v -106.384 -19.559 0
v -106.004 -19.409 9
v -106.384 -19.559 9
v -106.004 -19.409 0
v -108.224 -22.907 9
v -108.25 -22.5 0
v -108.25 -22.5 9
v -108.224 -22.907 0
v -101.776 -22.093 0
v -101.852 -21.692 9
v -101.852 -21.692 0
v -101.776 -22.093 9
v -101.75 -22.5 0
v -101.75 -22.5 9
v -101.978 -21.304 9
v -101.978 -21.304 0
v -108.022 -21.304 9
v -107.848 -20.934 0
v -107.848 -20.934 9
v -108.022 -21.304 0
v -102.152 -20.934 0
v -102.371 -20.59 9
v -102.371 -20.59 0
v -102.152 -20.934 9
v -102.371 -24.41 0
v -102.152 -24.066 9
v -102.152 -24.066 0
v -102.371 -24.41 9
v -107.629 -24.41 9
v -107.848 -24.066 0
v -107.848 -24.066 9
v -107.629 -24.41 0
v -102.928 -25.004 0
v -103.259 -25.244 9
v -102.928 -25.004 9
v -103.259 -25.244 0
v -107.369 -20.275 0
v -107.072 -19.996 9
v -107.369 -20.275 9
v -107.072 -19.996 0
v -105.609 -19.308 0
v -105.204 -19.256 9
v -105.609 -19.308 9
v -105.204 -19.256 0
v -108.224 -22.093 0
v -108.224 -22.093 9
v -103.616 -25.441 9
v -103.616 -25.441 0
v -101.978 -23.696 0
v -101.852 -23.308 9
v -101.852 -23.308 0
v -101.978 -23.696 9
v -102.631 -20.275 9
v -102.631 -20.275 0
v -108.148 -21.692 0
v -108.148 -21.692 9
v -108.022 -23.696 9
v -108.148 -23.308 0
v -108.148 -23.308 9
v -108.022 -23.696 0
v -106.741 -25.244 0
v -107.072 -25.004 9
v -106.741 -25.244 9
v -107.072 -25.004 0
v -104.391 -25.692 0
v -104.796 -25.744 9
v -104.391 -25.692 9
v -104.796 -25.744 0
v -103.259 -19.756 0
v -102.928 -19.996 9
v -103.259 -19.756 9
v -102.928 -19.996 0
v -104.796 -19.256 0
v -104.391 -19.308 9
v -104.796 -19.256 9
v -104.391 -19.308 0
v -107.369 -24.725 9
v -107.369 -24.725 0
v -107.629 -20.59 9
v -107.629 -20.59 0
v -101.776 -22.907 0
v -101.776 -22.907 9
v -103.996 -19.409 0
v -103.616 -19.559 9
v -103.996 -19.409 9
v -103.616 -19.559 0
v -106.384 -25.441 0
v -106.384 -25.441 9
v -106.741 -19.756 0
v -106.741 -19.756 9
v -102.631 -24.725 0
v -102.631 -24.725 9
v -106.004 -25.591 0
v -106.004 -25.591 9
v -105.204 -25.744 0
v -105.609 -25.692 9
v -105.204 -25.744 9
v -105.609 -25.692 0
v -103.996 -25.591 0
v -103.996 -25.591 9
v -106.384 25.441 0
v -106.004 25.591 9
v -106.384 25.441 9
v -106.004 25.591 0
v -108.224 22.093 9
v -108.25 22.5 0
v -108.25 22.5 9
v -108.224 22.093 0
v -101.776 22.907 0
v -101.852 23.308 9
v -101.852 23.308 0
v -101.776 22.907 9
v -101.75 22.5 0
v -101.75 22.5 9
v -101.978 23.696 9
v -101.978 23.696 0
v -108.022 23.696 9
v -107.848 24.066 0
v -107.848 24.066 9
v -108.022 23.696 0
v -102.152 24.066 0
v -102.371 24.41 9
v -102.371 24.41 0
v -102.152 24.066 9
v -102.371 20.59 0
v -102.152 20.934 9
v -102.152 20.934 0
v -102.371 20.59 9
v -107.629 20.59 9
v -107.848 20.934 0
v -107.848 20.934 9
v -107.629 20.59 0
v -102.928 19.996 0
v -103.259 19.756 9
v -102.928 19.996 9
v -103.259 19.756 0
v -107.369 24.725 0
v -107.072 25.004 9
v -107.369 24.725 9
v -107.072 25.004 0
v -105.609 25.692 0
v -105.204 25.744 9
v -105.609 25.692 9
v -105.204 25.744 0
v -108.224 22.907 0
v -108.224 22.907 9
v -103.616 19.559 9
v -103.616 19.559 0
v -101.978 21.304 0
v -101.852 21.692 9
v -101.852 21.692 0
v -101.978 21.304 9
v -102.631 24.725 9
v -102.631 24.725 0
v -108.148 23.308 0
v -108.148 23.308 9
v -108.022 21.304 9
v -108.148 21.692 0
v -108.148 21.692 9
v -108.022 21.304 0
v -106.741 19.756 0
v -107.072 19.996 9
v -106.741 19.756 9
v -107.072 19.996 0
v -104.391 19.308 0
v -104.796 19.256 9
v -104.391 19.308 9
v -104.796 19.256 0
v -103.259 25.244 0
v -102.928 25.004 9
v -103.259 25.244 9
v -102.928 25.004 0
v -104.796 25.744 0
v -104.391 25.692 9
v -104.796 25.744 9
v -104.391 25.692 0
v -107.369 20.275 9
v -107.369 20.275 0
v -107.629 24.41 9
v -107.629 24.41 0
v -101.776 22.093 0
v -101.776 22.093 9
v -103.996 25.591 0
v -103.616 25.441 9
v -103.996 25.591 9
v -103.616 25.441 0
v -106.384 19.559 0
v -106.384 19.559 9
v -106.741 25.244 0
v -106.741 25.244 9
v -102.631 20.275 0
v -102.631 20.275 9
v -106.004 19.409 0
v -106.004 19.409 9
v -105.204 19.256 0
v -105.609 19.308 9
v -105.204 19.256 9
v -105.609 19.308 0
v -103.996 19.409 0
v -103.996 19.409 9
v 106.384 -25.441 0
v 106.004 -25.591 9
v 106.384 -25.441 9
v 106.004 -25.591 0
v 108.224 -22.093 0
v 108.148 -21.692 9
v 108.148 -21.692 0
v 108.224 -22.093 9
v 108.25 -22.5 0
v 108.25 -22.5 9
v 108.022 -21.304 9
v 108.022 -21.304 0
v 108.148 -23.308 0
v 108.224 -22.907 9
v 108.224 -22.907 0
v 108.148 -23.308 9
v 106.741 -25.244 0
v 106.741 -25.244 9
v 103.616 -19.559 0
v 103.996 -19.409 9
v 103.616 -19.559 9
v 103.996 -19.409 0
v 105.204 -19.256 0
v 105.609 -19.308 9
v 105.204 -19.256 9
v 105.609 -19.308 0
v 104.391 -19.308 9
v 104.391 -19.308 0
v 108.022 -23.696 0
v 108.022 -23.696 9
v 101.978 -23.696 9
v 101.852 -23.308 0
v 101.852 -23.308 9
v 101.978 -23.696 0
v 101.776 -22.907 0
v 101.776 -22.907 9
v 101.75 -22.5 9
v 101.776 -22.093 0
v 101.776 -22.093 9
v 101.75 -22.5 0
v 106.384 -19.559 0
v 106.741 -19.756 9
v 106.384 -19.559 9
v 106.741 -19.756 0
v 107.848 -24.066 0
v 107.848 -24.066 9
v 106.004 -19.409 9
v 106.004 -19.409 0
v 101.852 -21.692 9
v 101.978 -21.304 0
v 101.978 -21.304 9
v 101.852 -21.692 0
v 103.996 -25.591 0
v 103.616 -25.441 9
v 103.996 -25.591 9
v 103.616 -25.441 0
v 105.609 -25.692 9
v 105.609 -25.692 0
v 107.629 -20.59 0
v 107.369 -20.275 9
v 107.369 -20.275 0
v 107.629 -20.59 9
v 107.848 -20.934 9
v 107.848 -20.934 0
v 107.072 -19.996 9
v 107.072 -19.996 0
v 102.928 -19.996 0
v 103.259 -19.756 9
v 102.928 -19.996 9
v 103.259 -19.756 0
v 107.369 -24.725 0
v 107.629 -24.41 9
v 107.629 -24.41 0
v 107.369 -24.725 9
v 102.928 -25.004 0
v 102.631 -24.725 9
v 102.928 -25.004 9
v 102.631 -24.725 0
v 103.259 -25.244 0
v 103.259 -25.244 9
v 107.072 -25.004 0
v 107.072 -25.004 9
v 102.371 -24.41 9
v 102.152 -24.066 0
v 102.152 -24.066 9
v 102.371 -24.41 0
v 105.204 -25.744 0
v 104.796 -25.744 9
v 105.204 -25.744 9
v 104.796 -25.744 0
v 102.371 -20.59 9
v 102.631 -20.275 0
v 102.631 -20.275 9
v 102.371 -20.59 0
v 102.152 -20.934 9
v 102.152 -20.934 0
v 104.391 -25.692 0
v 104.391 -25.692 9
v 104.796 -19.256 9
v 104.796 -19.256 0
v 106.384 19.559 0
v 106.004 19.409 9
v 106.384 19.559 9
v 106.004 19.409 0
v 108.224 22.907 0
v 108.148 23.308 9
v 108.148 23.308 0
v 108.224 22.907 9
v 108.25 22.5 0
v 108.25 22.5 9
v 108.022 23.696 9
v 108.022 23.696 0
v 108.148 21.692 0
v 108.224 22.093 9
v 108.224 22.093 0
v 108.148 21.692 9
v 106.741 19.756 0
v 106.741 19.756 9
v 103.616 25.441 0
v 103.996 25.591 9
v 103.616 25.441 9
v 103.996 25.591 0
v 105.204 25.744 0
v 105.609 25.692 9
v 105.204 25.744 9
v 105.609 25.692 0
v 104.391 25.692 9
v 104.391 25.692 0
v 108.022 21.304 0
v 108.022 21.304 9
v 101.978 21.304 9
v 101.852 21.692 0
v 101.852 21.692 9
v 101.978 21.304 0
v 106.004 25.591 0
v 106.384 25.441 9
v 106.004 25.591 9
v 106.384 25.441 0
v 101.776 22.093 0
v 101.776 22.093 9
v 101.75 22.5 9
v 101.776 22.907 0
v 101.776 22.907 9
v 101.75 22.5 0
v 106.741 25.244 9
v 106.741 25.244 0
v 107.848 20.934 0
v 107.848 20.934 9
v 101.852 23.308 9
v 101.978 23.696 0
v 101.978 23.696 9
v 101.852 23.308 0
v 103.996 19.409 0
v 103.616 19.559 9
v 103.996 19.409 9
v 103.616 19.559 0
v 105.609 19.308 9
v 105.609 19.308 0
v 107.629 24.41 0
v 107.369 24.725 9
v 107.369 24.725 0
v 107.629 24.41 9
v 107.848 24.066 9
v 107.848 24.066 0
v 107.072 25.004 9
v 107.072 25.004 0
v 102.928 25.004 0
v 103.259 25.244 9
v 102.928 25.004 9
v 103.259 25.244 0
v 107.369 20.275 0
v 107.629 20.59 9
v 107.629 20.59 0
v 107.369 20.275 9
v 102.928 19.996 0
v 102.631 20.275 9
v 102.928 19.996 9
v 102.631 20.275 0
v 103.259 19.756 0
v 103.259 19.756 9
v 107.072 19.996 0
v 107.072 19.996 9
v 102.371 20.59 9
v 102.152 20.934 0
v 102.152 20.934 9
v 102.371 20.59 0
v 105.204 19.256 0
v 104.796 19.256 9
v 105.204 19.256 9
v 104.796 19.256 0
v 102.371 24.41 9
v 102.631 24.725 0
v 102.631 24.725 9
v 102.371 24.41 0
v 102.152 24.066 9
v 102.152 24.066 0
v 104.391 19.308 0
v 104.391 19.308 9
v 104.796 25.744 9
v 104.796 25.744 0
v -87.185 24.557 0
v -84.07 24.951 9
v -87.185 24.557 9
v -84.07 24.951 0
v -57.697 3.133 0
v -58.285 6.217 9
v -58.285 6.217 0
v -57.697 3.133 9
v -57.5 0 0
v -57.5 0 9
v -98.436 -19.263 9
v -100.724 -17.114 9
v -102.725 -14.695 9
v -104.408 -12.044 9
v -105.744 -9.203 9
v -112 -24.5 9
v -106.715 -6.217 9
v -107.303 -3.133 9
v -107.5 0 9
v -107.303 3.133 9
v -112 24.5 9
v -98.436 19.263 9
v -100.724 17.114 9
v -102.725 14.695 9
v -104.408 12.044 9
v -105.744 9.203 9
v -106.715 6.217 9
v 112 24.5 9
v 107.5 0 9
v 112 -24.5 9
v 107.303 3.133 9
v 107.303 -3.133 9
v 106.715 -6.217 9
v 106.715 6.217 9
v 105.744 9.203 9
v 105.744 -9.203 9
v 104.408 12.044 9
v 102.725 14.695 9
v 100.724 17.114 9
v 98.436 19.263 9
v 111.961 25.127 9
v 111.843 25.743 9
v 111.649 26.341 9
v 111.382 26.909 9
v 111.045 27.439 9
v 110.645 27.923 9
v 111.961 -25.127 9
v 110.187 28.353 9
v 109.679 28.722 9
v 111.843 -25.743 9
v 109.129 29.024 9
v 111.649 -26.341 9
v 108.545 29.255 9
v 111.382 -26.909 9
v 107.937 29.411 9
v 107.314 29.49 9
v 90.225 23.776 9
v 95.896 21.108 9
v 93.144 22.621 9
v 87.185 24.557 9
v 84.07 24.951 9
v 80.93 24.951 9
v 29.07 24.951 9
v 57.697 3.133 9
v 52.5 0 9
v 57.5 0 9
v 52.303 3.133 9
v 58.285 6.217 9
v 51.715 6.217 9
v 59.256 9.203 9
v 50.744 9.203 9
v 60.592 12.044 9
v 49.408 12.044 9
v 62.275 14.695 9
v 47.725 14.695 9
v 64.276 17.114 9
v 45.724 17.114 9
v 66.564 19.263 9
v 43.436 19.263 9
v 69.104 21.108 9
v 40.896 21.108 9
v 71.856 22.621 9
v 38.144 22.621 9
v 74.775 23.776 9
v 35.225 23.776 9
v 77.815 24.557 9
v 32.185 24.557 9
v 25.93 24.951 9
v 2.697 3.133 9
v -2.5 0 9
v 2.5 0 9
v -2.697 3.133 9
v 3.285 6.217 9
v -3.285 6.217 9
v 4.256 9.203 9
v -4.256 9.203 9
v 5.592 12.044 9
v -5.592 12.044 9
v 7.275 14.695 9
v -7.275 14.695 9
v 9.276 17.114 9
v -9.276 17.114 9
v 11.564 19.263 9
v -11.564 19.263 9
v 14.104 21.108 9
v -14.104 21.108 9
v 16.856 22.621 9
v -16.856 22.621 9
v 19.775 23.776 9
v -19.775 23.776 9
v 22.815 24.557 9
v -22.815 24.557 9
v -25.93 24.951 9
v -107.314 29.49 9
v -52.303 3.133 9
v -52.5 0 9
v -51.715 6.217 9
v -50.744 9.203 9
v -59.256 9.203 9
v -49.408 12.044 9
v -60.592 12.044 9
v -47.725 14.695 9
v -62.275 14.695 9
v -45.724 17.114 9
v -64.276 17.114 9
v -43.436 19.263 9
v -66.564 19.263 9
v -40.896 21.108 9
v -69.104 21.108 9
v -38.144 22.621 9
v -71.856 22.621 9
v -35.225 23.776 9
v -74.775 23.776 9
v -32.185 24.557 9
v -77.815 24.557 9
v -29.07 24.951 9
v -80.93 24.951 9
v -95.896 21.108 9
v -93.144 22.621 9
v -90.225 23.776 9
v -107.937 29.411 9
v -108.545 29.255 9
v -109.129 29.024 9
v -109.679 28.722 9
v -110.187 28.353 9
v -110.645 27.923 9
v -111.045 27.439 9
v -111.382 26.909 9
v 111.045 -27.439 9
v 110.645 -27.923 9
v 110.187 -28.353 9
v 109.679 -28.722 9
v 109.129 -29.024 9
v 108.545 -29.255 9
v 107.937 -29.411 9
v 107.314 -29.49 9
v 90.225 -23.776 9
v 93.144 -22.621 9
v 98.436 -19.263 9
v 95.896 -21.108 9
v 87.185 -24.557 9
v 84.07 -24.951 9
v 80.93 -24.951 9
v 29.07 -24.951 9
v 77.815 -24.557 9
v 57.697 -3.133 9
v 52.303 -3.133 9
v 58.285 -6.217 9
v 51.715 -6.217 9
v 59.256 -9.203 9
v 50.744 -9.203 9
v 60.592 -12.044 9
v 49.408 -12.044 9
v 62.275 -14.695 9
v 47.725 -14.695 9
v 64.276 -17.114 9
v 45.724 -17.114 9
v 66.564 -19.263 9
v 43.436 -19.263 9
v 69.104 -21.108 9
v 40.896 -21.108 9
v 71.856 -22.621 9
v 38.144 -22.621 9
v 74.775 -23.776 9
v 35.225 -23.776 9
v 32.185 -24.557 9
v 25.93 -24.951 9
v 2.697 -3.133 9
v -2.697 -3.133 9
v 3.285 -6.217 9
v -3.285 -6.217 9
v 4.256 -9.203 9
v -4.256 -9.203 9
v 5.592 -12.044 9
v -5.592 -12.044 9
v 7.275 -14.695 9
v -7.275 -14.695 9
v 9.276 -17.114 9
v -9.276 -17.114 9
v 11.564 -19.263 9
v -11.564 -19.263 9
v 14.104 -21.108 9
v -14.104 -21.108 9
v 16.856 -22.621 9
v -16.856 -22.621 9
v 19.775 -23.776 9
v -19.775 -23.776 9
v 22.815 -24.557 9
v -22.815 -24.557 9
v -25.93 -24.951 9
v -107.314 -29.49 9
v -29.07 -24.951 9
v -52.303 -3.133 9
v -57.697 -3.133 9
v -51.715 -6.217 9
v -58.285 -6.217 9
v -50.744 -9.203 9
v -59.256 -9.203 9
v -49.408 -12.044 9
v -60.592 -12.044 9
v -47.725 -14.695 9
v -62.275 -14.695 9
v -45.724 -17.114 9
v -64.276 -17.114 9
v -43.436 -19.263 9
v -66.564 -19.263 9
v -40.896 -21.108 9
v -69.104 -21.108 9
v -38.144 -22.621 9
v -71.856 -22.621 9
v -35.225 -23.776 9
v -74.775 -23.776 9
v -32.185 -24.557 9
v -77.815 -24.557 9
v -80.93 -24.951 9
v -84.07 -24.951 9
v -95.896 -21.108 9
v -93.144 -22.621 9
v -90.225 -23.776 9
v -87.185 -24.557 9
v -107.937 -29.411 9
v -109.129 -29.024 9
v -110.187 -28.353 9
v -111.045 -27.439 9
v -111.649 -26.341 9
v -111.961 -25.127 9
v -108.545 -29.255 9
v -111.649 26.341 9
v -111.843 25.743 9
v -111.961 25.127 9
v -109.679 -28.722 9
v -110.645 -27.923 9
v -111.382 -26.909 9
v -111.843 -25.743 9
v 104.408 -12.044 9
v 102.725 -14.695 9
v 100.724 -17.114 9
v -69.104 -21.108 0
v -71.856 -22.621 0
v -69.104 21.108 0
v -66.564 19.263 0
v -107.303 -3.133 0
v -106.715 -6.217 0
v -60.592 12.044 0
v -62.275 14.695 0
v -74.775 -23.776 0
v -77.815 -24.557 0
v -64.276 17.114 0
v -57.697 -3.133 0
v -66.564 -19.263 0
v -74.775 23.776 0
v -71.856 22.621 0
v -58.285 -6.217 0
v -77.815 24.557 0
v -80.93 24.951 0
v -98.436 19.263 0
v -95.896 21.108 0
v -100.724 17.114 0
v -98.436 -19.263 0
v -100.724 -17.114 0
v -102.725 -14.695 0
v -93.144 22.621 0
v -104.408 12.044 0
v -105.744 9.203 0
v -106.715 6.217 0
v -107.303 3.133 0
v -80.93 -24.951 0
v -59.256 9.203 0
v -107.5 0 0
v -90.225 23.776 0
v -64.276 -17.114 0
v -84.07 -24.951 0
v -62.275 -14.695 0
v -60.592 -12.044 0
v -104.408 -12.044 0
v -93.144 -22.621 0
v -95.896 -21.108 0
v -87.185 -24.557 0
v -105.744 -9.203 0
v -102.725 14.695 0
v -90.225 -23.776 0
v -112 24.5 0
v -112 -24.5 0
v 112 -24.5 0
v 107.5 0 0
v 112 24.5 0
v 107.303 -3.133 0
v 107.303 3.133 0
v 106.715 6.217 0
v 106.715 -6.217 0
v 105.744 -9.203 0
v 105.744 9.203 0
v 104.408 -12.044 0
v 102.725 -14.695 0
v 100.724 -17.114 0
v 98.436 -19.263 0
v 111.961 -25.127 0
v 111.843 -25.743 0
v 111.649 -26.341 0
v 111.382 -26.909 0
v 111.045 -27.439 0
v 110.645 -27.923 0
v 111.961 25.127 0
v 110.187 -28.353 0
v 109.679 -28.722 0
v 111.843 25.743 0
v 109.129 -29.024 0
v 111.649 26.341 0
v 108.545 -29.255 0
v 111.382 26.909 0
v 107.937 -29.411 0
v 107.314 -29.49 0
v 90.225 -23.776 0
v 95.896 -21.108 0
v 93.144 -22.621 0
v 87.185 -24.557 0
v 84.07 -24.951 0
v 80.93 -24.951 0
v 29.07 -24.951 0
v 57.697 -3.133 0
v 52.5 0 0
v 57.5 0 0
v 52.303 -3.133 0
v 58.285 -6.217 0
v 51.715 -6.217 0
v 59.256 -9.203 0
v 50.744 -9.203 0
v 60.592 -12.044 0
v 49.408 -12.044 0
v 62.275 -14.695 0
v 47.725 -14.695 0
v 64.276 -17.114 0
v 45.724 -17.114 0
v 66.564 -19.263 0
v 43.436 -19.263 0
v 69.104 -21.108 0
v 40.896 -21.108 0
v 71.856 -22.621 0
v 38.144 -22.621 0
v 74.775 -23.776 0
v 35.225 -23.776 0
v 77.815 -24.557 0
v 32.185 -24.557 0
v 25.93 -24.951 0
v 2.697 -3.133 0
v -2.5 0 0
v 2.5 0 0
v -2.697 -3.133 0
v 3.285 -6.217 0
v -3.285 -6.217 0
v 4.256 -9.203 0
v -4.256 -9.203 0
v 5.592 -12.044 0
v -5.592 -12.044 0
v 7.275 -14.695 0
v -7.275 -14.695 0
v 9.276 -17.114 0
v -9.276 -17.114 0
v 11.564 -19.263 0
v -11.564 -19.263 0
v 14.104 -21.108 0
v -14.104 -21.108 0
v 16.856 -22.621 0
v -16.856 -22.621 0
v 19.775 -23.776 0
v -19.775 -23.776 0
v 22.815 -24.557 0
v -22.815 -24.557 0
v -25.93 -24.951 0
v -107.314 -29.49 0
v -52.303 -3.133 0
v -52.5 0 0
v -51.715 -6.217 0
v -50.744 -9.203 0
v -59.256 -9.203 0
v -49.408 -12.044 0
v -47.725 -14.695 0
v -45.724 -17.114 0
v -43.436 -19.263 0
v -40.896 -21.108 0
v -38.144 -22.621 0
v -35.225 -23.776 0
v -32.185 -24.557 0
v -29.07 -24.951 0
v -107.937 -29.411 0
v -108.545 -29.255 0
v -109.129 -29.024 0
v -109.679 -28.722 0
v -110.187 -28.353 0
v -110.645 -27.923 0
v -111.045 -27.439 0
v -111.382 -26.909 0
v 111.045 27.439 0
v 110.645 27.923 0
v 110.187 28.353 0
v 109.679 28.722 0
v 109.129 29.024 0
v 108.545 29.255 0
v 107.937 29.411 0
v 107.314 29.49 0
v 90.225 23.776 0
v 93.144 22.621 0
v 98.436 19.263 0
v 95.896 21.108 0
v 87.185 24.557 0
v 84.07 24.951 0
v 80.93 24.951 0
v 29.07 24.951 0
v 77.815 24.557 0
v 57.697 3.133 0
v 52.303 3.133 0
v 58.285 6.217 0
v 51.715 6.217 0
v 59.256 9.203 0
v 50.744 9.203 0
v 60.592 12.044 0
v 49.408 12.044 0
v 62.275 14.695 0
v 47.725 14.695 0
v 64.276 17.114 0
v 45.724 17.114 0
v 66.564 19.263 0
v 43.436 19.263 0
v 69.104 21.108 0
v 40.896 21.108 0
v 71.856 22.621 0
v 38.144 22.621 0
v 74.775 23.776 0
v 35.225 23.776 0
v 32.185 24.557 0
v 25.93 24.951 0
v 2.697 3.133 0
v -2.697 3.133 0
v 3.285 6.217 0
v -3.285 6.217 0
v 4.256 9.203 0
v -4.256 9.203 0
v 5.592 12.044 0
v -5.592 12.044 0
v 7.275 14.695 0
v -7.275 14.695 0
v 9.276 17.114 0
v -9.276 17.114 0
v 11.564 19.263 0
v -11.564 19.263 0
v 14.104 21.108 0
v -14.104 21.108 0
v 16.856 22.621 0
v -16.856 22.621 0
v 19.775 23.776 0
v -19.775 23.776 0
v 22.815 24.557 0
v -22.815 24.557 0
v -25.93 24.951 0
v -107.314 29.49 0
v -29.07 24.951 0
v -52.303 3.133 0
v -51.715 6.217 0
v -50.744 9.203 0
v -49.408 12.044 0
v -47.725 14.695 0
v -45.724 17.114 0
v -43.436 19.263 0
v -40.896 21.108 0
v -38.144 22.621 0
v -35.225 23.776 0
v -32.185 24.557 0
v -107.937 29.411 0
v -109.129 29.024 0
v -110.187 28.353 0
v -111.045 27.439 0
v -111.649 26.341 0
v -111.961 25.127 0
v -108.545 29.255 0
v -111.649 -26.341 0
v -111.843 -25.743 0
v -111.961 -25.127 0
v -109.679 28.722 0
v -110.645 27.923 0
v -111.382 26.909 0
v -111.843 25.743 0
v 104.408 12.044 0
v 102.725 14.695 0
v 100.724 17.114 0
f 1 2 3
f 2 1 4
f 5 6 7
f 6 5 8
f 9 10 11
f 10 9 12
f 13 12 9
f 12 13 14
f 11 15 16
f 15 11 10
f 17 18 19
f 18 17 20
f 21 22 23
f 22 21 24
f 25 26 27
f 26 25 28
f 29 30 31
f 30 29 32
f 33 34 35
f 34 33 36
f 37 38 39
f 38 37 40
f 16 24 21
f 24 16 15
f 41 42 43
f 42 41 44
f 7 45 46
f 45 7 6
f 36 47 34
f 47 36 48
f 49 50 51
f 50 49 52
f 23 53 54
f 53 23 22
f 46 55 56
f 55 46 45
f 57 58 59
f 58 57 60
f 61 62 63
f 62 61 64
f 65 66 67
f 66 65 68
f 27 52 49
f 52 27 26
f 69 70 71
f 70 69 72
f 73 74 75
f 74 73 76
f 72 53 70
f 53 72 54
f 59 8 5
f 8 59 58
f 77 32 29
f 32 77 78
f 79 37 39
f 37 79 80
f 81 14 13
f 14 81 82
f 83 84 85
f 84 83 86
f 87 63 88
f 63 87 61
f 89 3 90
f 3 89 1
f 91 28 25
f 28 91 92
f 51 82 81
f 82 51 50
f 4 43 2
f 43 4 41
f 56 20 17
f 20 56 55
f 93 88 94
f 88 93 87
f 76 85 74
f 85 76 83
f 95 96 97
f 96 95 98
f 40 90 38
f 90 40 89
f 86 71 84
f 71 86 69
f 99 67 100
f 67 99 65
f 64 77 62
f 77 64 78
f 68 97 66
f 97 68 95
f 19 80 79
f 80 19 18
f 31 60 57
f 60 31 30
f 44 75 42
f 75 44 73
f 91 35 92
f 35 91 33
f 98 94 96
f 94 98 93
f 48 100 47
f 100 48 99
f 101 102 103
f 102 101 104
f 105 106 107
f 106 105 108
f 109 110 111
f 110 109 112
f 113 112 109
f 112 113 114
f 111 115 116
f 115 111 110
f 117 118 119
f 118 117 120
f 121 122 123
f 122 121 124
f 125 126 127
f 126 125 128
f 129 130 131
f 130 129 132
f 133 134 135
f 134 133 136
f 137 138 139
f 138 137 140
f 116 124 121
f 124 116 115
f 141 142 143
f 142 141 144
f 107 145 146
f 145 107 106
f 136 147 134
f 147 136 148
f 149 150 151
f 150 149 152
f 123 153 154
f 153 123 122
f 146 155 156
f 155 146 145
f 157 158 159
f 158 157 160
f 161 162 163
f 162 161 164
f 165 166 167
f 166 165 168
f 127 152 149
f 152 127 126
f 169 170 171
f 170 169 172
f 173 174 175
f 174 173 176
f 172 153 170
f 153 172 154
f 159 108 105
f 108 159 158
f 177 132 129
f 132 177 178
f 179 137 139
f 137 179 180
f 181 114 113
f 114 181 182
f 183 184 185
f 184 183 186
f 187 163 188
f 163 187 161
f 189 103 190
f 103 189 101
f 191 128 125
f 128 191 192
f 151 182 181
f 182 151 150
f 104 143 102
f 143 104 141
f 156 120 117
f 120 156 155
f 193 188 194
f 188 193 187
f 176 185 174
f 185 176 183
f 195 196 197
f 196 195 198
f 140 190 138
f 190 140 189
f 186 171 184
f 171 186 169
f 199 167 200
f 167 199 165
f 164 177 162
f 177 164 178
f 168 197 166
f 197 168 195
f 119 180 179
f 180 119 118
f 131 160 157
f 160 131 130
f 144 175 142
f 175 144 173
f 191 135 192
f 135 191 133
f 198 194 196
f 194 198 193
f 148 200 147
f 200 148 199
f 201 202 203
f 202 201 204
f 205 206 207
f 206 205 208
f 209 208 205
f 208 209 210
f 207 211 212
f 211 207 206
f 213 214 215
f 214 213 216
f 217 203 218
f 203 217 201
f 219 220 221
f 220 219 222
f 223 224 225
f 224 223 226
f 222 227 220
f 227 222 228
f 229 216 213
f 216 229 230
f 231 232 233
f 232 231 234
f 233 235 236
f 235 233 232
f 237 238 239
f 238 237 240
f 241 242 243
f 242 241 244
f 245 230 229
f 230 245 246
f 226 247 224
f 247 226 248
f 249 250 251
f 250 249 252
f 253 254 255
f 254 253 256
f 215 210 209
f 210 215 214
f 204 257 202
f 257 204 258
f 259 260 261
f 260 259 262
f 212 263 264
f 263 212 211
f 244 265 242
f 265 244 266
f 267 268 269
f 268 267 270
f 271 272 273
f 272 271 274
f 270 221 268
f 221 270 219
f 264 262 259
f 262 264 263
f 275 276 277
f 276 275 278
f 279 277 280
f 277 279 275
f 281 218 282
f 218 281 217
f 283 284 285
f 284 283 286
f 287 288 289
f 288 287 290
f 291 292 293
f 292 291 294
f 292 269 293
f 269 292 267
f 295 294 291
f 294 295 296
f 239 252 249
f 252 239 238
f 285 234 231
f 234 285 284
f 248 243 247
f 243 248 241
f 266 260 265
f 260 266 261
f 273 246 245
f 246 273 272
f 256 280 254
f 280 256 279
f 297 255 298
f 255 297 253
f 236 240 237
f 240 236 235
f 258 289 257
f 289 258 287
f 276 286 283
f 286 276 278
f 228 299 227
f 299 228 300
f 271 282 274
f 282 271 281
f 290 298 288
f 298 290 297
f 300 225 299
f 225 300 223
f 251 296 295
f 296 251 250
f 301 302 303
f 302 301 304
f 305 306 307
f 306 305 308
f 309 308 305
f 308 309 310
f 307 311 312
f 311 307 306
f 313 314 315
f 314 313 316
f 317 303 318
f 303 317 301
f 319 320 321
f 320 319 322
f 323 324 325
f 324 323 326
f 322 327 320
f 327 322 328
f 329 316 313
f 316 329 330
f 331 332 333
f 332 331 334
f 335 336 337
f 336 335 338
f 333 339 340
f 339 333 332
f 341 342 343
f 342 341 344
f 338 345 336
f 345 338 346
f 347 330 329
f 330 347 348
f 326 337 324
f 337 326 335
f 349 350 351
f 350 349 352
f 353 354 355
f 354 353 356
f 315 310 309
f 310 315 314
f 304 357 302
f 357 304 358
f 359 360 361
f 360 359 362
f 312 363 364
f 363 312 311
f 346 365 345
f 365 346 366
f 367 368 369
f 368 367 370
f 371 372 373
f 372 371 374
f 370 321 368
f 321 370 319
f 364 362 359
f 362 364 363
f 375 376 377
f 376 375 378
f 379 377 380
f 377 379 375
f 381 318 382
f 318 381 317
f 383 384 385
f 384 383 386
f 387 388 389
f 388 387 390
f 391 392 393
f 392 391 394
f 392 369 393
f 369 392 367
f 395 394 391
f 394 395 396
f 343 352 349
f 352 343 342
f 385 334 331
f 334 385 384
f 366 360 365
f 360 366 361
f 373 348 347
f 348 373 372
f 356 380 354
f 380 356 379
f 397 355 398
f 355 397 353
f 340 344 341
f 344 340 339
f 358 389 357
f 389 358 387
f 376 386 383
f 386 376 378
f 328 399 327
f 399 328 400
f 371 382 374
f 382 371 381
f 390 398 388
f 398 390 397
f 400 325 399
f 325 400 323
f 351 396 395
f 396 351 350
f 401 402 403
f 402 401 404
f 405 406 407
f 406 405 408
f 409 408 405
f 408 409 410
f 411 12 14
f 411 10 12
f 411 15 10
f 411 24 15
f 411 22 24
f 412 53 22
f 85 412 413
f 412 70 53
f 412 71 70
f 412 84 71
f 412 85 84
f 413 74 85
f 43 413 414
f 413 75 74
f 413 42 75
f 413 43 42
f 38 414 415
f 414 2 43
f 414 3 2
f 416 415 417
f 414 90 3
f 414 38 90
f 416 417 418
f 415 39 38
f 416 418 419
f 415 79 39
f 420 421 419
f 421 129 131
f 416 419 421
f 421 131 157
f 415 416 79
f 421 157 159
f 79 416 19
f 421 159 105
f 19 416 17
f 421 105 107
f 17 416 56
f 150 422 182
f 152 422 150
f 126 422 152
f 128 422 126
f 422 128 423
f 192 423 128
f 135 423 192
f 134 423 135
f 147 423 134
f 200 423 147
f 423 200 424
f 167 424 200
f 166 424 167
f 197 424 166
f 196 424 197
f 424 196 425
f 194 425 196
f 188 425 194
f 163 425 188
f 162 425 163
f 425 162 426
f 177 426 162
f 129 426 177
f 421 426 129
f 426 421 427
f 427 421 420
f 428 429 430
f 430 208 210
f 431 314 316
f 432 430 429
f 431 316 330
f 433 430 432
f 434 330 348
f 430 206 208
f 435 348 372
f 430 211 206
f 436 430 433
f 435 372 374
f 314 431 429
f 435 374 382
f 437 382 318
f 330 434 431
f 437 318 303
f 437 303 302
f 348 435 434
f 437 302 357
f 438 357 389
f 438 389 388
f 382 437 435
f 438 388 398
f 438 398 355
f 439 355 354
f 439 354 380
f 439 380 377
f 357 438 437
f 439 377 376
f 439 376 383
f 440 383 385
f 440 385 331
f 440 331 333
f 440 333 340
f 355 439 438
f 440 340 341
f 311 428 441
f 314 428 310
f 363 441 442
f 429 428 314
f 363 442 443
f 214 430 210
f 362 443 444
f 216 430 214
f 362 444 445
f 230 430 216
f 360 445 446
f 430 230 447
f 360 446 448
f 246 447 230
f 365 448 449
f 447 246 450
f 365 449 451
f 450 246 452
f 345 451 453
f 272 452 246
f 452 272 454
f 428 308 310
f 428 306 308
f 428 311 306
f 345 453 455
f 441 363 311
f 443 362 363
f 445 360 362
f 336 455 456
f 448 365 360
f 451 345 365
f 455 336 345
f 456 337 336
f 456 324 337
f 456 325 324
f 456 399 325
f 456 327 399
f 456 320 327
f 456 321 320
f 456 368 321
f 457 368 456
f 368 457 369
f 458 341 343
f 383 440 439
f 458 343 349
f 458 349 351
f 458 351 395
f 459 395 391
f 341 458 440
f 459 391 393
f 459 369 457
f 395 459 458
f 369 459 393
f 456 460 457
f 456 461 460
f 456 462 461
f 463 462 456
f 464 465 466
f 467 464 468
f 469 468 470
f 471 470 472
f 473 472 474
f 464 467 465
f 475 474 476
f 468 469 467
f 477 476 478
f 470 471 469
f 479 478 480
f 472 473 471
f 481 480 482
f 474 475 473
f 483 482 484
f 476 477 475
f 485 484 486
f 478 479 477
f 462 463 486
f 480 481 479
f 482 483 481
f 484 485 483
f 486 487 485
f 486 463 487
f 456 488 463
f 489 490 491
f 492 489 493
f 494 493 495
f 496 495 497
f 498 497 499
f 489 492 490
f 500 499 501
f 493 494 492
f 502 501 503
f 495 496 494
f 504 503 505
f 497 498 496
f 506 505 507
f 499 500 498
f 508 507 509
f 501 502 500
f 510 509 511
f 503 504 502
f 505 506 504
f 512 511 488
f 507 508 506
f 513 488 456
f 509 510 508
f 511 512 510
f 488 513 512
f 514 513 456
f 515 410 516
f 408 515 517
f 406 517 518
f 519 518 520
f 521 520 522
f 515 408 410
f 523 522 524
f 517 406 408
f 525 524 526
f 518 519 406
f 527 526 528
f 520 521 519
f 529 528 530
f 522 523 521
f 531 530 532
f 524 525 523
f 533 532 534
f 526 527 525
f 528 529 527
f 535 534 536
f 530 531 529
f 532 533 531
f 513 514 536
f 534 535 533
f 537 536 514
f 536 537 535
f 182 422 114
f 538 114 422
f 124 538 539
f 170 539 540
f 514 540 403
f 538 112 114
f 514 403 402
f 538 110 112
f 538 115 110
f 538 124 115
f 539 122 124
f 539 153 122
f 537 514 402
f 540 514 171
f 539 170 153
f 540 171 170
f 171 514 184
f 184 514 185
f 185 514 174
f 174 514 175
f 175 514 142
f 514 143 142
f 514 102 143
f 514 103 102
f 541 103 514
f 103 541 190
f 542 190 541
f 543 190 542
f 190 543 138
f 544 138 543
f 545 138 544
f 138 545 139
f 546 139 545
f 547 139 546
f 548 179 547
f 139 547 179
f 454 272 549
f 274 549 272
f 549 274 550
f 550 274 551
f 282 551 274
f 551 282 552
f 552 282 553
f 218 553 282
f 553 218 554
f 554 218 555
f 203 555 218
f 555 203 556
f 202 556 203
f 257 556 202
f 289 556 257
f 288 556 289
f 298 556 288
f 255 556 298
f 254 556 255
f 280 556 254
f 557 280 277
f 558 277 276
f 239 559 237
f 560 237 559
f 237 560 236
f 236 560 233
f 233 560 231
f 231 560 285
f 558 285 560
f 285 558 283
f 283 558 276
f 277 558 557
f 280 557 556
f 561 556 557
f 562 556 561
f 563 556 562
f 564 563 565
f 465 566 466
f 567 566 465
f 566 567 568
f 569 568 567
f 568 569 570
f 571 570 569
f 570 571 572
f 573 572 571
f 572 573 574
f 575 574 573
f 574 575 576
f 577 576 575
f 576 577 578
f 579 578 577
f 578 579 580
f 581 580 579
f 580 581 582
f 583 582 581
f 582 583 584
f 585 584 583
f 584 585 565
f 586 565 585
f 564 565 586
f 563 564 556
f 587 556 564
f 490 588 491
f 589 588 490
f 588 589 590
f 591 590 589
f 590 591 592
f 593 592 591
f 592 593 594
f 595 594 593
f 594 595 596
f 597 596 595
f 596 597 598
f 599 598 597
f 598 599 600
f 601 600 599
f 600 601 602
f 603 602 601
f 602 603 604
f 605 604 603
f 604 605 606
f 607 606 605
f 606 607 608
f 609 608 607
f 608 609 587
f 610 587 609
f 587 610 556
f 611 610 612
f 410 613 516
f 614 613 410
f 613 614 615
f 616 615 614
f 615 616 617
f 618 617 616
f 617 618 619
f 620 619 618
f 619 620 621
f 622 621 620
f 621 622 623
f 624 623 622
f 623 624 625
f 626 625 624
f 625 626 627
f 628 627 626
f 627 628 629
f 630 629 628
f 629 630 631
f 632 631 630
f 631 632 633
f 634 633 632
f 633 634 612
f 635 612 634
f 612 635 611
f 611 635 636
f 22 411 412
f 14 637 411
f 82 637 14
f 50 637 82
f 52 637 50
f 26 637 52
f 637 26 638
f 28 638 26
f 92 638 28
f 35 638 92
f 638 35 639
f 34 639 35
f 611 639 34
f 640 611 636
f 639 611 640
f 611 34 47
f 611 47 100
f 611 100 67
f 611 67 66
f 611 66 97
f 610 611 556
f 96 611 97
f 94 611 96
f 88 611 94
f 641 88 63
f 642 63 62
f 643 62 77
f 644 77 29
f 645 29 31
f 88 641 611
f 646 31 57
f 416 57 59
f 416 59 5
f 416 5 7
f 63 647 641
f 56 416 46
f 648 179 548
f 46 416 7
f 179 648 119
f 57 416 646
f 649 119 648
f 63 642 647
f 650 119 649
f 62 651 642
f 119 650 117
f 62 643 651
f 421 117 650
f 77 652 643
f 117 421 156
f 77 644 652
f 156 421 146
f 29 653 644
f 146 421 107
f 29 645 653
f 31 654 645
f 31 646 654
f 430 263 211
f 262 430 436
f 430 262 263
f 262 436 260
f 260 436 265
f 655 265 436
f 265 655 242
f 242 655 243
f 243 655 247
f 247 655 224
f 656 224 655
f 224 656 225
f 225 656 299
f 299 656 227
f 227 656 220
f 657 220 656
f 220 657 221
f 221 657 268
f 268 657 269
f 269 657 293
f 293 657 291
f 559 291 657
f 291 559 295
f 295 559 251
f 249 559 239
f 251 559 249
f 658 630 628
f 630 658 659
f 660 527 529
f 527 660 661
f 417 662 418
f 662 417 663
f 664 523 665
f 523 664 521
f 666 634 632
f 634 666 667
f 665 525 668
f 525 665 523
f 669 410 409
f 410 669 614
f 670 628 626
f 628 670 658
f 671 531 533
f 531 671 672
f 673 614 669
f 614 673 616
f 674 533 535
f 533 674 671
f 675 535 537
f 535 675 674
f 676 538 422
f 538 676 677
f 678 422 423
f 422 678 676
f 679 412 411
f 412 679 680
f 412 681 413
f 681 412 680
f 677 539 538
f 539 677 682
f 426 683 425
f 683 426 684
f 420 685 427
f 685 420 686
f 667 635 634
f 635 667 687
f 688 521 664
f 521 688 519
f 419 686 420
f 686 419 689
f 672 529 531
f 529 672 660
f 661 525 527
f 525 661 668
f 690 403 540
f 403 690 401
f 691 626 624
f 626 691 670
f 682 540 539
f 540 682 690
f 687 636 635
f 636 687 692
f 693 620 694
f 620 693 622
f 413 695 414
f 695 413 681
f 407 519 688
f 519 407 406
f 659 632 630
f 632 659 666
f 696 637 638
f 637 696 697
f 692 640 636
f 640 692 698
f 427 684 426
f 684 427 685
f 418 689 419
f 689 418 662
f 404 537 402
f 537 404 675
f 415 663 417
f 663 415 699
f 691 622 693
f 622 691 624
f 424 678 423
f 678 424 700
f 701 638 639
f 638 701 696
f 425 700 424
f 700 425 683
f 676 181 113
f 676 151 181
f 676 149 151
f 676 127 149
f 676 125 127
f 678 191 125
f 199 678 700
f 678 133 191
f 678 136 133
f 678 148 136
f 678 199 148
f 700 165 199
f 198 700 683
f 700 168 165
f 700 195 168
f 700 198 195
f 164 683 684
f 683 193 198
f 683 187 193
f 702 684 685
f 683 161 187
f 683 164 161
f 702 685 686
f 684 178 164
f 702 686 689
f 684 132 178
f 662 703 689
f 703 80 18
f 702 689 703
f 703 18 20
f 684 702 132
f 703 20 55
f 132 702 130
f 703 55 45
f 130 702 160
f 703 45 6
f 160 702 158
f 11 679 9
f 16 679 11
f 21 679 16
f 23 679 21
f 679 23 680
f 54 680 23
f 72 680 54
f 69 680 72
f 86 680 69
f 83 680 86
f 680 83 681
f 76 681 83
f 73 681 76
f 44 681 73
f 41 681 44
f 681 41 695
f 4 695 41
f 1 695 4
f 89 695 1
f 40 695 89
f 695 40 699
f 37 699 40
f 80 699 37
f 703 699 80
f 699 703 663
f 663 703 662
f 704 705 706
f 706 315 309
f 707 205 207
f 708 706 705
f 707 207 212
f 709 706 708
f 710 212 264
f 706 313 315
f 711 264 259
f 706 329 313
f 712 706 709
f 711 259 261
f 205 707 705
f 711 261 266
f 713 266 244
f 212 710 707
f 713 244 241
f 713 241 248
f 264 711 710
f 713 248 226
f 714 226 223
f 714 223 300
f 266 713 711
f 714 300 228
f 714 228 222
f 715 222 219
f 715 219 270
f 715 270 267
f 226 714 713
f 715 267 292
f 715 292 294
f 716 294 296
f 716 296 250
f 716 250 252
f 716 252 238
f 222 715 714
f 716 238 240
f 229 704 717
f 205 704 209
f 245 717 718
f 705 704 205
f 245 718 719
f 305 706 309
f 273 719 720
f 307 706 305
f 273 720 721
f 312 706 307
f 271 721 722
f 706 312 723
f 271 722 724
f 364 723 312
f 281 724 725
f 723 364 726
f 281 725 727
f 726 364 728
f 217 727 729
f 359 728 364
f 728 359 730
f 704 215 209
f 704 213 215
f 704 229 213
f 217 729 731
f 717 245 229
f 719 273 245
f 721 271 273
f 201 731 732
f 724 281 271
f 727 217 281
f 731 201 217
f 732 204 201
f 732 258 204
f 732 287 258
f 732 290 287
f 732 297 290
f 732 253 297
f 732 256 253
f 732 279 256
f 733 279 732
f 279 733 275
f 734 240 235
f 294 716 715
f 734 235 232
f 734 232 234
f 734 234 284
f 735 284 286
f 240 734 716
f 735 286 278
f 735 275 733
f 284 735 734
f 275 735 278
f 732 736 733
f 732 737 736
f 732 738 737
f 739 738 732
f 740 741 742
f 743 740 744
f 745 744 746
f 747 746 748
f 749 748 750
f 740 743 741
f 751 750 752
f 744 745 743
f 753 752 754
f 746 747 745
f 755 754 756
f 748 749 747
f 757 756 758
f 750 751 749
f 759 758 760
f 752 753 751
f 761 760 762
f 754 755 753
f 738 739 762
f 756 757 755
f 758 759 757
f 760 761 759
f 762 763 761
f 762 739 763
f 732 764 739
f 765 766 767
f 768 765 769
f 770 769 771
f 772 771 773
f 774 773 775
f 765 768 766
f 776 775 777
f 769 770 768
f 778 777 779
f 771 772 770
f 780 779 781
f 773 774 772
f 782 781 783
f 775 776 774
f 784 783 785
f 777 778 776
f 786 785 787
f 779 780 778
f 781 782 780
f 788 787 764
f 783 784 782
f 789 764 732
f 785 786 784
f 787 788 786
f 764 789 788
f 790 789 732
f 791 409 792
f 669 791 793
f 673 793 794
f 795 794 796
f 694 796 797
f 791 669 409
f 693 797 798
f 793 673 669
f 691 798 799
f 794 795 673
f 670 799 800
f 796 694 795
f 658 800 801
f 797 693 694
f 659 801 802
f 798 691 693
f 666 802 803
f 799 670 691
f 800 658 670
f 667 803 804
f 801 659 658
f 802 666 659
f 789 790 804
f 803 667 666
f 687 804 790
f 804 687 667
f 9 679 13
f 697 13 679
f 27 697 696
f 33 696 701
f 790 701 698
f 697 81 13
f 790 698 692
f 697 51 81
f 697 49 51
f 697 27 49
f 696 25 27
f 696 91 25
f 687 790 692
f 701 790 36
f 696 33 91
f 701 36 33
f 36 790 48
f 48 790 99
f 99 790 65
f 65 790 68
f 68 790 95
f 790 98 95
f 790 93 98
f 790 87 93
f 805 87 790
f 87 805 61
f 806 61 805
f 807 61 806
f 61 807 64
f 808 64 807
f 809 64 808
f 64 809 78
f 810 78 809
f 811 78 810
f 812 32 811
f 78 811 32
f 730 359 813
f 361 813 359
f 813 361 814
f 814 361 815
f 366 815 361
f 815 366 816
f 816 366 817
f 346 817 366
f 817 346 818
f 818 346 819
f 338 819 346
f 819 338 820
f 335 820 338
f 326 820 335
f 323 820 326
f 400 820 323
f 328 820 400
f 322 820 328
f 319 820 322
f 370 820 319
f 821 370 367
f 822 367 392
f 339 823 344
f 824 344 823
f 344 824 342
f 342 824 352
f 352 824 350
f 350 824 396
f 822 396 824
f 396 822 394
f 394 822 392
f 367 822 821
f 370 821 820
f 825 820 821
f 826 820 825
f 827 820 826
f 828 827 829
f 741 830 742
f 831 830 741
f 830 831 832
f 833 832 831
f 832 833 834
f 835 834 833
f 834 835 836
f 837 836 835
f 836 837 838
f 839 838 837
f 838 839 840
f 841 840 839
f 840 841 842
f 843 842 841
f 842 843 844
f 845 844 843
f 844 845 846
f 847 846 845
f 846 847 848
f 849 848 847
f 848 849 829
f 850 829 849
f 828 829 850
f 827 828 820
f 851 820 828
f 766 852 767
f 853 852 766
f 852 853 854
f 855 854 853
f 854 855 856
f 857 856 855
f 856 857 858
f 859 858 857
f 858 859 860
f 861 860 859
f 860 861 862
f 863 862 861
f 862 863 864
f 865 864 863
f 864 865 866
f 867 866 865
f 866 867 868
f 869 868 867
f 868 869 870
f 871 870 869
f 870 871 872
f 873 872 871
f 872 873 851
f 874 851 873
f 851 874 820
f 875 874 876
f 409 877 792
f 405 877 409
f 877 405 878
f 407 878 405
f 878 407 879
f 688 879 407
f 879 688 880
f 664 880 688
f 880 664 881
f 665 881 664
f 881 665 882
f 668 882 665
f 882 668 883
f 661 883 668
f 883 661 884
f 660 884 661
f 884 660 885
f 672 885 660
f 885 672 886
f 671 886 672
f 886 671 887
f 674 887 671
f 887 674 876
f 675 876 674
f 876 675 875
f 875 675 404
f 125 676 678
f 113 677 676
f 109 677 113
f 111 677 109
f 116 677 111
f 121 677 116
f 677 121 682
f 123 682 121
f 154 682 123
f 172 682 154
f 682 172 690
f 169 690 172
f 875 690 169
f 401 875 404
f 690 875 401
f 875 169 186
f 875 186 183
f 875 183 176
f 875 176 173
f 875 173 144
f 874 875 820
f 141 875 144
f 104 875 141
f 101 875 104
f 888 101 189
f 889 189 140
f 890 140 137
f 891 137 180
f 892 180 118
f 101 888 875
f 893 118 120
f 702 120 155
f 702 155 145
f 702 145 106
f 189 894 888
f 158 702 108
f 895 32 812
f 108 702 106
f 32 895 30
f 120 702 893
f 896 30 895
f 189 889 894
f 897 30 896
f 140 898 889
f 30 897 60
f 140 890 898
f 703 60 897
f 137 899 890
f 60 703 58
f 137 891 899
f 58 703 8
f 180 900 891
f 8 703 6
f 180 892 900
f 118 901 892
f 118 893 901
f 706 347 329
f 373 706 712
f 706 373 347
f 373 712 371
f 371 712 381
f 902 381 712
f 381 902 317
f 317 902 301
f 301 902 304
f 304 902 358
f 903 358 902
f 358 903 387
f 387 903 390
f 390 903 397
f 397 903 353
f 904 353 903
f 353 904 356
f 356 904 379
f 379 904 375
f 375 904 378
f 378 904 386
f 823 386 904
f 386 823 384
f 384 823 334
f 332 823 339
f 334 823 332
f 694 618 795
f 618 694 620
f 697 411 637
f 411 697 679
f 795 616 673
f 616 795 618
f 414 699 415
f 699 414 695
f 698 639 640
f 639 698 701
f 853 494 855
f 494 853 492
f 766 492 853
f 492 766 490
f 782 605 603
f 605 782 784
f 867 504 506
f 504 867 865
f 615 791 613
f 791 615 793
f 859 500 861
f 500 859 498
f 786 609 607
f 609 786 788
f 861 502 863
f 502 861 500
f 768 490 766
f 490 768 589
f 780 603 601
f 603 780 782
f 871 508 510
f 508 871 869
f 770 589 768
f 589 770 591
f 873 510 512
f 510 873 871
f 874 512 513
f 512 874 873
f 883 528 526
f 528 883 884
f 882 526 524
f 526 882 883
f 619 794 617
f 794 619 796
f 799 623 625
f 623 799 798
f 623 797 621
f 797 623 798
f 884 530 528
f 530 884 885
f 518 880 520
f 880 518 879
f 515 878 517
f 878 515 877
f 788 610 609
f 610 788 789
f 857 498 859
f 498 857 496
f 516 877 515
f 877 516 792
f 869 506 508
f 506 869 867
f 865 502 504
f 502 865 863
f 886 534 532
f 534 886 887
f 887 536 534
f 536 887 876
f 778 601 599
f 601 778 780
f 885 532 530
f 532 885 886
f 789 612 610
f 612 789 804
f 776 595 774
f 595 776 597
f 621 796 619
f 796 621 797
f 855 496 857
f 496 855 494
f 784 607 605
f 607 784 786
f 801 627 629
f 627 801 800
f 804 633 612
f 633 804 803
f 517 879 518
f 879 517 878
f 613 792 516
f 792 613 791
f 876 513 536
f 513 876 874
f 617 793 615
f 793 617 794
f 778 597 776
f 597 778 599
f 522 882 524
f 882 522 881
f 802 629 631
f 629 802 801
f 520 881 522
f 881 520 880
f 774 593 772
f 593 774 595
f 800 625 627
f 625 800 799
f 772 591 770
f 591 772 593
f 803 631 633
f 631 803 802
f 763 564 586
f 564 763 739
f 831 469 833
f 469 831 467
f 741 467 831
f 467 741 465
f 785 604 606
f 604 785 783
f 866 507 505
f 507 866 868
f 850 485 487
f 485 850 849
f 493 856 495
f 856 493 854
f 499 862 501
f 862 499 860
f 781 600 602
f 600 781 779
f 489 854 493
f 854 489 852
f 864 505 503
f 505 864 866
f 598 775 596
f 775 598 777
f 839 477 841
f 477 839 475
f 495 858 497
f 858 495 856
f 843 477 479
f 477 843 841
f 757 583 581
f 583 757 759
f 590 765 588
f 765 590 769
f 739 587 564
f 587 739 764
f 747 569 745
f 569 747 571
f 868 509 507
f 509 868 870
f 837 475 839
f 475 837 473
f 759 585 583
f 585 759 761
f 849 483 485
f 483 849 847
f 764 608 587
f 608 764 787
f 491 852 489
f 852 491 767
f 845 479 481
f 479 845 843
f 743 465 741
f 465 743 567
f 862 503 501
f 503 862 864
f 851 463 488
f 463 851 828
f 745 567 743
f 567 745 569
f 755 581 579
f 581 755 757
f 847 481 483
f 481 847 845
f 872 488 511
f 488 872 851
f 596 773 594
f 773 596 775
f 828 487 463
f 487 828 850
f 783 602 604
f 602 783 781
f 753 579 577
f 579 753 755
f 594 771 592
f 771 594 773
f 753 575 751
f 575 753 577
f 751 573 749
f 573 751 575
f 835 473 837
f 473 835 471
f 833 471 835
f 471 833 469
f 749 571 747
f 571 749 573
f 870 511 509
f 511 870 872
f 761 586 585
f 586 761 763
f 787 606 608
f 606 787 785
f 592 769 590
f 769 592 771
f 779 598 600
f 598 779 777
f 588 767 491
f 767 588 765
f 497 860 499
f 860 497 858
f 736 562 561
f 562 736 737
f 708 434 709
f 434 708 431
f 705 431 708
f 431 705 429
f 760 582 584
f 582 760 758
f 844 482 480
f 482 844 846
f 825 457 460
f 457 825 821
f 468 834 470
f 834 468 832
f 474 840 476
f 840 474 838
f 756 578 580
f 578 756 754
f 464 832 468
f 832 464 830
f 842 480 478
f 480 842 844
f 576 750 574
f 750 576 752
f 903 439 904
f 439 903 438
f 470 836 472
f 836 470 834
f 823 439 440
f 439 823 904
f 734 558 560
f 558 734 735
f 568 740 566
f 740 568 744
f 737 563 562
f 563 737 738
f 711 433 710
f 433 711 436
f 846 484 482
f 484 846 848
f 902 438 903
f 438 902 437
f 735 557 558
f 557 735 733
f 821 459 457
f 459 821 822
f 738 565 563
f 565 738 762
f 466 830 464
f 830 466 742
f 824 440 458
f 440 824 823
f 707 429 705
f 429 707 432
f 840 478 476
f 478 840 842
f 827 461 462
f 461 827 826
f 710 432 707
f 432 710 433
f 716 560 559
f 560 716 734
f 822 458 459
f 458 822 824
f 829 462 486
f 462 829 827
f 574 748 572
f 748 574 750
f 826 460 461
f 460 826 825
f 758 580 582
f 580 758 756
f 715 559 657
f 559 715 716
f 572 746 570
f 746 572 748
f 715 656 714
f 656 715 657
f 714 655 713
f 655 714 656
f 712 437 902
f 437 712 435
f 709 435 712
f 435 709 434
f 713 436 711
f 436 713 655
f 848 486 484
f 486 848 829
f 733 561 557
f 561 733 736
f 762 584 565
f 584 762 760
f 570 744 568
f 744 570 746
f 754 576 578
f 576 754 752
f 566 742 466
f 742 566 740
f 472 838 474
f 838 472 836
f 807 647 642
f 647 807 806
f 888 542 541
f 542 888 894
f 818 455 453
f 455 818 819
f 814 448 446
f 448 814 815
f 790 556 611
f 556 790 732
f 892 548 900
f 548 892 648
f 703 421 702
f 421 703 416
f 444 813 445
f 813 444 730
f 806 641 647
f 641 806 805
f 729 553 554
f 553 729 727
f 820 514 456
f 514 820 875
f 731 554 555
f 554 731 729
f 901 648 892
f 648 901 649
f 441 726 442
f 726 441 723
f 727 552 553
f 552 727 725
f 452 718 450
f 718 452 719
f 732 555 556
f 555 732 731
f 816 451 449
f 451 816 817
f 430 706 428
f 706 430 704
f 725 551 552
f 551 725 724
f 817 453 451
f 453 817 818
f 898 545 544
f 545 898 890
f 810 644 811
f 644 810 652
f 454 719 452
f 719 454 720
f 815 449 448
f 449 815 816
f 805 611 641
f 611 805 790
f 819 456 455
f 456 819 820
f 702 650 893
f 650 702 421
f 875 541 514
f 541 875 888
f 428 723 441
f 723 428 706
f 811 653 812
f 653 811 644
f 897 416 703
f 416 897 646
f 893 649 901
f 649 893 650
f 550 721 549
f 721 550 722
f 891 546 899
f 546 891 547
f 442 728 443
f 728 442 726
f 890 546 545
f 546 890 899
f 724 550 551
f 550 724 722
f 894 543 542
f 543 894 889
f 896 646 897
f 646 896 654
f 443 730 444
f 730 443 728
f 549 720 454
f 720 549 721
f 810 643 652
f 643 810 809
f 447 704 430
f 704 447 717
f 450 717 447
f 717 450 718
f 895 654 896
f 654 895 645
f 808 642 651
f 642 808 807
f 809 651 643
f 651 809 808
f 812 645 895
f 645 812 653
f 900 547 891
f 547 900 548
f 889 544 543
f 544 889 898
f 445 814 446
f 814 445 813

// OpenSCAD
$fn = 50;


difference() {
	union() {
		hull() {
			translate(v = [-107.0000000000, 24.5000000000, 0]) {
				cylinder(h = 9, r = 5);
			}
			translate(v = [107.0000000000, 24.5000000000, 0]) {
				cylinder(h = 9, r = 5);
			}
			translate(v = [-107.0000000000, -24.5000000000, 0]) {
				cylinder(h = 9, r = 5);
			}
			translate(v = [107.0000000000, -24.5000000000, 0]) {
				cylinder(h = 9, r = 5);
			}
		}
	}
	union() {
		#translate(v = [-105.0000000000, -22.5000000000, -100.0000000000]) {
			cylinder(h = 200, r = 3.2500000000);
		}
		#translate(v = [-105.0000000000, 22.5000000000, -100.0000000000]) {
			cylinder(h = 200, r = 3.2500000000);
		}
		#translate(v = [105.0000000000, -22.5000000000, -100.0000000000]) {
			cylinder(h = 200, r = 3.2500000000);
		}
		#translate(v = [105.0000000000, 22.5000000000, -100.0000000000]) {
			cylinder(h = 200, r = 3.2500000000);
		}
		#translate(v = [-82.5000000000, 0, 0]) {
			cylinder(h = 9, r = 25.0000000000);
		}
		#translate(v = [-27.5000000000, 0, 0]) {
			cylinder(h = 9, r = 25.0000000000);
		}
		#translate(v = [27.5000000000, 0, 0]) {
			cylinder(h = 9, r = 25.0000000000);
		}
		#translate(v = [82.5000000000, 0, 0]) {
			cylinder(h = 9, r = 25.0000000000);
		}
	}
}
